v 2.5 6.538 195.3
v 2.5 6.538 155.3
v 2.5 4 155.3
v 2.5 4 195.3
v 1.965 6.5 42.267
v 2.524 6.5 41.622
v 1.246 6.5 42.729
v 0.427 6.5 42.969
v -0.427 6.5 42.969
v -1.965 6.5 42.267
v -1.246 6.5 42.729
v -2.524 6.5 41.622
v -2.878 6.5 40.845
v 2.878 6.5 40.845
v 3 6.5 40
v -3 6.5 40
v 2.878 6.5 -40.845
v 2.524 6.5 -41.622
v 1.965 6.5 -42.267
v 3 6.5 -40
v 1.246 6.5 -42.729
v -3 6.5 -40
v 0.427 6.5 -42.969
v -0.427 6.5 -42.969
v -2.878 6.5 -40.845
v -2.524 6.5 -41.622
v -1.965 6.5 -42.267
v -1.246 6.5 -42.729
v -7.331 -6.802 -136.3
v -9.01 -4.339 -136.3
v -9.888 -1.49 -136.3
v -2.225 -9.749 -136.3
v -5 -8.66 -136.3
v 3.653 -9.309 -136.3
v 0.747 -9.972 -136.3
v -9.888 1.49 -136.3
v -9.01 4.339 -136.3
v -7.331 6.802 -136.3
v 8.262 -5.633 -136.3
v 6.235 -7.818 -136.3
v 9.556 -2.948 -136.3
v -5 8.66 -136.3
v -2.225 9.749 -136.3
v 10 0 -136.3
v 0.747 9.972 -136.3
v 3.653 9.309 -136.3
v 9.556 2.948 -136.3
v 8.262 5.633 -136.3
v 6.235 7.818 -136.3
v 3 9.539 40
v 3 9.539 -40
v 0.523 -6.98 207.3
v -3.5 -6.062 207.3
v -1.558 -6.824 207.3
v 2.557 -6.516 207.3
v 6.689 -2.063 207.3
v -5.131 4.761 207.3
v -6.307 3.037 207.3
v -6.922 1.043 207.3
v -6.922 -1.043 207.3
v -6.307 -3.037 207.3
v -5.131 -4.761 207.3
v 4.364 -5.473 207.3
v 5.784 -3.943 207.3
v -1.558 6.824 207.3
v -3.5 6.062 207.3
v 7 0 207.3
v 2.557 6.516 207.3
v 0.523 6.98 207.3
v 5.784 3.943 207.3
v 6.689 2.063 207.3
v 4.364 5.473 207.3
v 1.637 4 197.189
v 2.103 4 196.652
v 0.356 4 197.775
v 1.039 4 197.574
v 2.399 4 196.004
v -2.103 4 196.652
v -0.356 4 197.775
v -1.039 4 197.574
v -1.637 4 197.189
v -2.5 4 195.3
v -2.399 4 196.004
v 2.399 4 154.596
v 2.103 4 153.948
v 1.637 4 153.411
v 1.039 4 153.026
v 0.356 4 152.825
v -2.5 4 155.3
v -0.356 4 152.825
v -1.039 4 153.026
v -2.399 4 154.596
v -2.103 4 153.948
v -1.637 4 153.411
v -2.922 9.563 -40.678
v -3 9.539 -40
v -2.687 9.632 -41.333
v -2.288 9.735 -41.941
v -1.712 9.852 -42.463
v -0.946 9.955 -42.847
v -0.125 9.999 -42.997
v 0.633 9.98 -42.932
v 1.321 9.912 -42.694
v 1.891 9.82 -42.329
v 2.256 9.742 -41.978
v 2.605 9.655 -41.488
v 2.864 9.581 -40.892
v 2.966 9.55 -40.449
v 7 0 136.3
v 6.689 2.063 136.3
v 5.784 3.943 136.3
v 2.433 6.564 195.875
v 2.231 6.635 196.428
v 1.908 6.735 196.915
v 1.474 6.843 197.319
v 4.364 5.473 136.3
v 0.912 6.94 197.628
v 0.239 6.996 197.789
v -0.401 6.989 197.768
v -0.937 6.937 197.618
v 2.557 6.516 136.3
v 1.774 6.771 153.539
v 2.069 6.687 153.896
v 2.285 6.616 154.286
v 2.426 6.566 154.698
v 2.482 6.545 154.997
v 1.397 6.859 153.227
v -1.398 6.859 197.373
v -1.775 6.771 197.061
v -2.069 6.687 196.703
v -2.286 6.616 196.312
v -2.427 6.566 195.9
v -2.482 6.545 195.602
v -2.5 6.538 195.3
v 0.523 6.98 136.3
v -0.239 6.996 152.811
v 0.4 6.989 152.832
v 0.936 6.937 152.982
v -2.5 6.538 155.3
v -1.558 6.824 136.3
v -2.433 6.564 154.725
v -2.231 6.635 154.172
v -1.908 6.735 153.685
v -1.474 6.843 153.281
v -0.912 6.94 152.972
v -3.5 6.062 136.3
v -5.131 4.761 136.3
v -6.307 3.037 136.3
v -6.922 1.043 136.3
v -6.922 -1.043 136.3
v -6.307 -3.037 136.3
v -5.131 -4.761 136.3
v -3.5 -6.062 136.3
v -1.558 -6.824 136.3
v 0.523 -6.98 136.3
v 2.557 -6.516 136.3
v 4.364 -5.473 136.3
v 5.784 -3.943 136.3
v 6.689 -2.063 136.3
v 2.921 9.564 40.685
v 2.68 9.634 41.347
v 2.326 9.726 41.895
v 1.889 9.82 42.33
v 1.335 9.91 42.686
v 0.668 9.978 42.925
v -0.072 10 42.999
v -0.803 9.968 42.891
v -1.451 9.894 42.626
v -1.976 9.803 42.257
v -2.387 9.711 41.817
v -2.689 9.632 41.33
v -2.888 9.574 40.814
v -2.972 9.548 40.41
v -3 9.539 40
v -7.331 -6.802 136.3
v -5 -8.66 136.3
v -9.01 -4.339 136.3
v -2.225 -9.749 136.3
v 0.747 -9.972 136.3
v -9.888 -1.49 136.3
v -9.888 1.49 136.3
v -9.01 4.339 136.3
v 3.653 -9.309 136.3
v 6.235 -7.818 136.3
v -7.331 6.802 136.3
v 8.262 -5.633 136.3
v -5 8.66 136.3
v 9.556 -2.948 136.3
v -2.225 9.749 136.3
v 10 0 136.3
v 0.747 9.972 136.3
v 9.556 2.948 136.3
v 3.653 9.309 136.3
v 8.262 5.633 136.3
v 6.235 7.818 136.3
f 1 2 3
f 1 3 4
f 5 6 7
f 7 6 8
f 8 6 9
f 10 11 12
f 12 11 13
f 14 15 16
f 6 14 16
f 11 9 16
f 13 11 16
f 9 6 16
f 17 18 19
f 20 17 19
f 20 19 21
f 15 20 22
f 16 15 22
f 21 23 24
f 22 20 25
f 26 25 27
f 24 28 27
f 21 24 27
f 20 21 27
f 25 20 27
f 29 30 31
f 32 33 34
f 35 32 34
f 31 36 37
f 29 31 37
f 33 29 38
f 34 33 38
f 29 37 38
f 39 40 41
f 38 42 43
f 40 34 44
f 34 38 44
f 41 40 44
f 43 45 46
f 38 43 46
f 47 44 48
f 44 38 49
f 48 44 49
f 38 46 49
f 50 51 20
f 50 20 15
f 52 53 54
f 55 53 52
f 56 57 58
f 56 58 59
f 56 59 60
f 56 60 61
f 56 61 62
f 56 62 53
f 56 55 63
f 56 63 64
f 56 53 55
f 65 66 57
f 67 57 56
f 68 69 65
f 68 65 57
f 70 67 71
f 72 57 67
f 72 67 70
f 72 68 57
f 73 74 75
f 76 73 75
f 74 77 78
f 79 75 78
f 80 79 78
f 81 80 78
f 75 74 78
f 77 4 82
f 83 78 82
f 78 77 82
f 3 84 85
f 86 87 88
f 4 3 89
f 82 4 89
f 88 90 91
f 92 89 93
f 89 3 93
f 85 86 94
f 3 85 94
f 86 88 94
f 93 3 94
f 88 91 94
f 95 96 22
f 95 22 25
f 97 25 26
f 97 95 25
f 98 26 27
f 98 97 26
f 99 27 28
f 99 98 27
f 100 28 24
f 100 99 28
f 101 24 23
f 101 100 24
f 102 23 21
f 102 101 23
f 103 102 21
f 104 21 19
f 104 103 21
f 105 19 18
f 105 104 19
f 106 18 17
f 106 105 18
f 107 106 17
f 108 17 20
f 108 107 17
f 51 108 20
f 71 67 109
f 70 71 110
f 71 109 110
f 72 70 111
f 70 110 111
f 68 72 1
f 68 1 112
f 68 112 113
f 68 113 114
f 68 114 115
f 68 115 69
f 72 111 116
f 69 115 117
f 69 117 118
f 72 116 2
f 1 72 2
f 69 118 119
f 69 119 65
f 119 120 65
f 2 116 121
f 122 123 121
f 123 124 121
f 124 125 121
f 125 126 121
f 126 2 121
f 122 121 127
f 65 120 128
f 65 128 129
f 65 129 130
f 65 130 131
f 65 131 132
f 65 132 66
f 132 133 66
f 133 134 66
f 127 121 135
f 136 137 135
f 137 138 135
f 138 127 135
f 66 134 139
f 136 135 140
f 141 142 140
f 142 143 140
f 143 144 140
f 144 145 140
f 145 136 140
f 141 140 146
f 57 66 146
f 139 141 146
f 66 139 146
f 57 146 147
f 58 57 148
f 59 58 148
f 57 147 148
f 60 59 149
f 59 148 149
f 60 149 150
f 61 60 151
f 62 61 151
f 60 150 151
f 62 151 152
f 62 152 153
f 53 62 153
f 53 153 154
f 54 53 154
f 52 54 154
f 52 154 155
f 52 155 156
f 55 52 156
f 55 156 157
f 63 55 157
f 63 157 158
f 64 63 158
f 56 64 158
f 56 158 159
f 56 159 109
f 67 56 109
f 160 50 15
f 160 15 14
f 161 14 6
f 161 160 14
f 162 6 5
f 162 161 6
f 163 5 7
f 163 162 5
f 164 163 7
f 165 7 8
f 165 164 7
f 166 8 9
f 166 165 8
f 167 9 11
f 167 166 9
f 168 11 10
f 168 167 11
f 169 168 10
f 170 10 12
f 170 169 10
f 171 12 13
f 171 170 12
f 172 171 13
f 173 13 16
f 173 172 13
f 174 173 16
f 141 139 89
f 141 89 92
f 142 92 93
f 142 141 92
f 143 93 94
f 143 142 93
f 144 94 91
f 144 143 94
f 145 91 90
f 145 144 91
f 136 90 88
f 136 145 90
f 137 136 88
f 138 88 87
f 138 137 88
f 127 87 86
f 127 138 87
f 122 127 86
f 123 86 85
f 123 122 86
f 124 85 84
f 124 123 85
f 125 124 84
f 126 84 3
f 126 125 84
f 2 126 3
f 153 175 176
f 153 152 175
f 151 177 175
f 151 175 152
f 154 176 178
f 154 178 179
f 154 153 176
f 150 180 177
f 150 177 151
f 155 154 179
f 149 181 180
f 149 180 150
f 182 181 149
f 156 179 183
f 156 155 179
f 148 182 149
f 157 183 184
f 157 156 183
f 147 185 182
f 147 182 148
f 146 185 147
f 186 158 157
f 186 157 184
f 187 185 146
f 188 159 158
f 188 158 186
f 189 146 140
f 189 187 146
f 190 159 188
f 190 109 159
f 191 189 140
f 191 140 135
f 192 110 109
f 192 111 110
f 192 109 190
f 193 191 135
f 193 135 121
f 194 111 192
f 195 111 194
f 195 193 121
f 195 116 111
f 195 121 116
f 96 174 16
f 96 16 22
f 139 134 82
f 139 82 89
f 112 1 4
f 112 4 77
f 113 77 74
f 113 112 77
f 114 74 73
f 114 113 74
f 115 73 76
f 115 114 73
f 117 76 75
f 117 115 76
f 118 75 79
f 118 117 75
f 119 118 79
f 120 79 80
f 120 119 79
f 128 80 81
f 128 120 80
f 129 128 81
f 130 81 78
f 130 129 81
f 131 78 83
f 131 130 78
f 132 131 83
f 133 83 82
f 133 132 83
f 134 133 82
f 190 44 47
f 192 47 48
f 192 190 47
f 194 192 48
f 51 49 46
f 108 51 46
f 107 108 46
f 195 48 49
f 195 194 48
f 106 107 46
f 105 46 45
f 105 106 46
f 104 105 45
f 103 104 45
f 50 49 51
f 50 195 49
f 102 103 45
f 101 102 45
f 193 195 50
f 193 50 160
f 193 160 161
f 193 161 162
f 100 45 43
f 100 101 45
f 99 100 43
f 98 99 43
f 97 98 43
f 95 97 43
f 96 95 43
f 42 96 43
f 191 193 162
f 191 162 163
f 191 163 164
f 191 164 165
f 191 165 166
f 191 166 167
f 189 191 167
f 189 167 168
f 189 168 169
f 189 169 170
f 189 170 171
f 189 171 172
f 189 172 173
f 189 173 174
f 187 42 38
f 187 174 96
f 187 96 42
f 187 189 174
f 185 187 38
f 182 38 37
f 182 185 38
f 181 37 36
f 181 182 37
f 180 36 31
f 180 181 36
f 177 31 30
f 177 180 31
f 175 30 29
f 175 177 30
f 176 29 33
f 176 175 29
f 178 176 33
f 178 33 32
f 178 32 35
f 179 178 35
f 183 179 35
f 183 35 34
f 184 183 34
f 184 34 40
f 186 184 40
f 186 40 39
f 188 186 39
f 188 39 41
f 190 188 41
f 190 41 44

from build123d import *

# Parameters (mm, degrees)
IZIM1_R                     = 10
Y_KSEKLIK_EKSTR_ZYON1_DEPTH = 136.3
IZIM2_R                     = 7
Y_KSEKLIK_EKSTR_ZYON2_DEPTH = 71
KES_EKSTR_ZYON1_DEPTH       = 3
KES_EKSTR_ZYON2_DEPTH       = 3.5


with BuildPart() as part:
    # Çizim1 → Yükseklik-Ekstrüzyon1 (new, symmetric)
    with BuildSketch(Plane.XY):
        Circle(IZIM1_R)
    extrude(amount=Y_KSEKLIK_EKSTR_ZYON1_DEPTH, both=True)

    # Çizim2 → Yükseklik-Ekstrüzyon2 (add)
    with BuildSketch(Plane.XY.offset(136.3)):
        Circle(IZIM2_R)
    extrude(amount=Y_KSEKLIK_EKSTR_ZYON2_DEPTH)

    # Çizim3 → Kes-Ekstrüzyon1 (cut)
    with BuildSketch(Plane(origin=(0, 7, 0), x_dir=(1, 0, 0), z_dir=(0, 1, 0))):
        with BuildLine():
            Line((2.5, -155.3), (2.5, -195.3))
            ThreePointArc((2.5, -195.3), (0, -197.8), (-2.5, -195.3))
            Line((-2.5, -195.3), (-2.5, -155.3))
            ThreePointArc((-2.5, -155.3), (0, -152.8), (2.5, -155.3))
        make_face()
    extrude(amount=-KES_EKSTR_ZYON1_DEPTH, mode=Mode.SUBTRACT)

    # Çizim4 → Kes-Ekstrüzyon2 (cut)
    with BuildSketch(Plane(origin=(0, 10, 0), x_dir=(1, 0, 0), z_dir=(0, 1, 0))):
        with BuildLine():
            Line((-3, -40), (-3, 40))
            ThreePointArc((-3, 40), (0, 43), (3, 40))
            Line((3, 40), (3, -40))
            ThreePointArc((3, -40), (0, -43), (-3, -40))
        make_face()
    extrude(amount=-KES_EKSTR_ZYON2_DEPTH, mode=Mode.SUBTRACT)


solid = part.part
